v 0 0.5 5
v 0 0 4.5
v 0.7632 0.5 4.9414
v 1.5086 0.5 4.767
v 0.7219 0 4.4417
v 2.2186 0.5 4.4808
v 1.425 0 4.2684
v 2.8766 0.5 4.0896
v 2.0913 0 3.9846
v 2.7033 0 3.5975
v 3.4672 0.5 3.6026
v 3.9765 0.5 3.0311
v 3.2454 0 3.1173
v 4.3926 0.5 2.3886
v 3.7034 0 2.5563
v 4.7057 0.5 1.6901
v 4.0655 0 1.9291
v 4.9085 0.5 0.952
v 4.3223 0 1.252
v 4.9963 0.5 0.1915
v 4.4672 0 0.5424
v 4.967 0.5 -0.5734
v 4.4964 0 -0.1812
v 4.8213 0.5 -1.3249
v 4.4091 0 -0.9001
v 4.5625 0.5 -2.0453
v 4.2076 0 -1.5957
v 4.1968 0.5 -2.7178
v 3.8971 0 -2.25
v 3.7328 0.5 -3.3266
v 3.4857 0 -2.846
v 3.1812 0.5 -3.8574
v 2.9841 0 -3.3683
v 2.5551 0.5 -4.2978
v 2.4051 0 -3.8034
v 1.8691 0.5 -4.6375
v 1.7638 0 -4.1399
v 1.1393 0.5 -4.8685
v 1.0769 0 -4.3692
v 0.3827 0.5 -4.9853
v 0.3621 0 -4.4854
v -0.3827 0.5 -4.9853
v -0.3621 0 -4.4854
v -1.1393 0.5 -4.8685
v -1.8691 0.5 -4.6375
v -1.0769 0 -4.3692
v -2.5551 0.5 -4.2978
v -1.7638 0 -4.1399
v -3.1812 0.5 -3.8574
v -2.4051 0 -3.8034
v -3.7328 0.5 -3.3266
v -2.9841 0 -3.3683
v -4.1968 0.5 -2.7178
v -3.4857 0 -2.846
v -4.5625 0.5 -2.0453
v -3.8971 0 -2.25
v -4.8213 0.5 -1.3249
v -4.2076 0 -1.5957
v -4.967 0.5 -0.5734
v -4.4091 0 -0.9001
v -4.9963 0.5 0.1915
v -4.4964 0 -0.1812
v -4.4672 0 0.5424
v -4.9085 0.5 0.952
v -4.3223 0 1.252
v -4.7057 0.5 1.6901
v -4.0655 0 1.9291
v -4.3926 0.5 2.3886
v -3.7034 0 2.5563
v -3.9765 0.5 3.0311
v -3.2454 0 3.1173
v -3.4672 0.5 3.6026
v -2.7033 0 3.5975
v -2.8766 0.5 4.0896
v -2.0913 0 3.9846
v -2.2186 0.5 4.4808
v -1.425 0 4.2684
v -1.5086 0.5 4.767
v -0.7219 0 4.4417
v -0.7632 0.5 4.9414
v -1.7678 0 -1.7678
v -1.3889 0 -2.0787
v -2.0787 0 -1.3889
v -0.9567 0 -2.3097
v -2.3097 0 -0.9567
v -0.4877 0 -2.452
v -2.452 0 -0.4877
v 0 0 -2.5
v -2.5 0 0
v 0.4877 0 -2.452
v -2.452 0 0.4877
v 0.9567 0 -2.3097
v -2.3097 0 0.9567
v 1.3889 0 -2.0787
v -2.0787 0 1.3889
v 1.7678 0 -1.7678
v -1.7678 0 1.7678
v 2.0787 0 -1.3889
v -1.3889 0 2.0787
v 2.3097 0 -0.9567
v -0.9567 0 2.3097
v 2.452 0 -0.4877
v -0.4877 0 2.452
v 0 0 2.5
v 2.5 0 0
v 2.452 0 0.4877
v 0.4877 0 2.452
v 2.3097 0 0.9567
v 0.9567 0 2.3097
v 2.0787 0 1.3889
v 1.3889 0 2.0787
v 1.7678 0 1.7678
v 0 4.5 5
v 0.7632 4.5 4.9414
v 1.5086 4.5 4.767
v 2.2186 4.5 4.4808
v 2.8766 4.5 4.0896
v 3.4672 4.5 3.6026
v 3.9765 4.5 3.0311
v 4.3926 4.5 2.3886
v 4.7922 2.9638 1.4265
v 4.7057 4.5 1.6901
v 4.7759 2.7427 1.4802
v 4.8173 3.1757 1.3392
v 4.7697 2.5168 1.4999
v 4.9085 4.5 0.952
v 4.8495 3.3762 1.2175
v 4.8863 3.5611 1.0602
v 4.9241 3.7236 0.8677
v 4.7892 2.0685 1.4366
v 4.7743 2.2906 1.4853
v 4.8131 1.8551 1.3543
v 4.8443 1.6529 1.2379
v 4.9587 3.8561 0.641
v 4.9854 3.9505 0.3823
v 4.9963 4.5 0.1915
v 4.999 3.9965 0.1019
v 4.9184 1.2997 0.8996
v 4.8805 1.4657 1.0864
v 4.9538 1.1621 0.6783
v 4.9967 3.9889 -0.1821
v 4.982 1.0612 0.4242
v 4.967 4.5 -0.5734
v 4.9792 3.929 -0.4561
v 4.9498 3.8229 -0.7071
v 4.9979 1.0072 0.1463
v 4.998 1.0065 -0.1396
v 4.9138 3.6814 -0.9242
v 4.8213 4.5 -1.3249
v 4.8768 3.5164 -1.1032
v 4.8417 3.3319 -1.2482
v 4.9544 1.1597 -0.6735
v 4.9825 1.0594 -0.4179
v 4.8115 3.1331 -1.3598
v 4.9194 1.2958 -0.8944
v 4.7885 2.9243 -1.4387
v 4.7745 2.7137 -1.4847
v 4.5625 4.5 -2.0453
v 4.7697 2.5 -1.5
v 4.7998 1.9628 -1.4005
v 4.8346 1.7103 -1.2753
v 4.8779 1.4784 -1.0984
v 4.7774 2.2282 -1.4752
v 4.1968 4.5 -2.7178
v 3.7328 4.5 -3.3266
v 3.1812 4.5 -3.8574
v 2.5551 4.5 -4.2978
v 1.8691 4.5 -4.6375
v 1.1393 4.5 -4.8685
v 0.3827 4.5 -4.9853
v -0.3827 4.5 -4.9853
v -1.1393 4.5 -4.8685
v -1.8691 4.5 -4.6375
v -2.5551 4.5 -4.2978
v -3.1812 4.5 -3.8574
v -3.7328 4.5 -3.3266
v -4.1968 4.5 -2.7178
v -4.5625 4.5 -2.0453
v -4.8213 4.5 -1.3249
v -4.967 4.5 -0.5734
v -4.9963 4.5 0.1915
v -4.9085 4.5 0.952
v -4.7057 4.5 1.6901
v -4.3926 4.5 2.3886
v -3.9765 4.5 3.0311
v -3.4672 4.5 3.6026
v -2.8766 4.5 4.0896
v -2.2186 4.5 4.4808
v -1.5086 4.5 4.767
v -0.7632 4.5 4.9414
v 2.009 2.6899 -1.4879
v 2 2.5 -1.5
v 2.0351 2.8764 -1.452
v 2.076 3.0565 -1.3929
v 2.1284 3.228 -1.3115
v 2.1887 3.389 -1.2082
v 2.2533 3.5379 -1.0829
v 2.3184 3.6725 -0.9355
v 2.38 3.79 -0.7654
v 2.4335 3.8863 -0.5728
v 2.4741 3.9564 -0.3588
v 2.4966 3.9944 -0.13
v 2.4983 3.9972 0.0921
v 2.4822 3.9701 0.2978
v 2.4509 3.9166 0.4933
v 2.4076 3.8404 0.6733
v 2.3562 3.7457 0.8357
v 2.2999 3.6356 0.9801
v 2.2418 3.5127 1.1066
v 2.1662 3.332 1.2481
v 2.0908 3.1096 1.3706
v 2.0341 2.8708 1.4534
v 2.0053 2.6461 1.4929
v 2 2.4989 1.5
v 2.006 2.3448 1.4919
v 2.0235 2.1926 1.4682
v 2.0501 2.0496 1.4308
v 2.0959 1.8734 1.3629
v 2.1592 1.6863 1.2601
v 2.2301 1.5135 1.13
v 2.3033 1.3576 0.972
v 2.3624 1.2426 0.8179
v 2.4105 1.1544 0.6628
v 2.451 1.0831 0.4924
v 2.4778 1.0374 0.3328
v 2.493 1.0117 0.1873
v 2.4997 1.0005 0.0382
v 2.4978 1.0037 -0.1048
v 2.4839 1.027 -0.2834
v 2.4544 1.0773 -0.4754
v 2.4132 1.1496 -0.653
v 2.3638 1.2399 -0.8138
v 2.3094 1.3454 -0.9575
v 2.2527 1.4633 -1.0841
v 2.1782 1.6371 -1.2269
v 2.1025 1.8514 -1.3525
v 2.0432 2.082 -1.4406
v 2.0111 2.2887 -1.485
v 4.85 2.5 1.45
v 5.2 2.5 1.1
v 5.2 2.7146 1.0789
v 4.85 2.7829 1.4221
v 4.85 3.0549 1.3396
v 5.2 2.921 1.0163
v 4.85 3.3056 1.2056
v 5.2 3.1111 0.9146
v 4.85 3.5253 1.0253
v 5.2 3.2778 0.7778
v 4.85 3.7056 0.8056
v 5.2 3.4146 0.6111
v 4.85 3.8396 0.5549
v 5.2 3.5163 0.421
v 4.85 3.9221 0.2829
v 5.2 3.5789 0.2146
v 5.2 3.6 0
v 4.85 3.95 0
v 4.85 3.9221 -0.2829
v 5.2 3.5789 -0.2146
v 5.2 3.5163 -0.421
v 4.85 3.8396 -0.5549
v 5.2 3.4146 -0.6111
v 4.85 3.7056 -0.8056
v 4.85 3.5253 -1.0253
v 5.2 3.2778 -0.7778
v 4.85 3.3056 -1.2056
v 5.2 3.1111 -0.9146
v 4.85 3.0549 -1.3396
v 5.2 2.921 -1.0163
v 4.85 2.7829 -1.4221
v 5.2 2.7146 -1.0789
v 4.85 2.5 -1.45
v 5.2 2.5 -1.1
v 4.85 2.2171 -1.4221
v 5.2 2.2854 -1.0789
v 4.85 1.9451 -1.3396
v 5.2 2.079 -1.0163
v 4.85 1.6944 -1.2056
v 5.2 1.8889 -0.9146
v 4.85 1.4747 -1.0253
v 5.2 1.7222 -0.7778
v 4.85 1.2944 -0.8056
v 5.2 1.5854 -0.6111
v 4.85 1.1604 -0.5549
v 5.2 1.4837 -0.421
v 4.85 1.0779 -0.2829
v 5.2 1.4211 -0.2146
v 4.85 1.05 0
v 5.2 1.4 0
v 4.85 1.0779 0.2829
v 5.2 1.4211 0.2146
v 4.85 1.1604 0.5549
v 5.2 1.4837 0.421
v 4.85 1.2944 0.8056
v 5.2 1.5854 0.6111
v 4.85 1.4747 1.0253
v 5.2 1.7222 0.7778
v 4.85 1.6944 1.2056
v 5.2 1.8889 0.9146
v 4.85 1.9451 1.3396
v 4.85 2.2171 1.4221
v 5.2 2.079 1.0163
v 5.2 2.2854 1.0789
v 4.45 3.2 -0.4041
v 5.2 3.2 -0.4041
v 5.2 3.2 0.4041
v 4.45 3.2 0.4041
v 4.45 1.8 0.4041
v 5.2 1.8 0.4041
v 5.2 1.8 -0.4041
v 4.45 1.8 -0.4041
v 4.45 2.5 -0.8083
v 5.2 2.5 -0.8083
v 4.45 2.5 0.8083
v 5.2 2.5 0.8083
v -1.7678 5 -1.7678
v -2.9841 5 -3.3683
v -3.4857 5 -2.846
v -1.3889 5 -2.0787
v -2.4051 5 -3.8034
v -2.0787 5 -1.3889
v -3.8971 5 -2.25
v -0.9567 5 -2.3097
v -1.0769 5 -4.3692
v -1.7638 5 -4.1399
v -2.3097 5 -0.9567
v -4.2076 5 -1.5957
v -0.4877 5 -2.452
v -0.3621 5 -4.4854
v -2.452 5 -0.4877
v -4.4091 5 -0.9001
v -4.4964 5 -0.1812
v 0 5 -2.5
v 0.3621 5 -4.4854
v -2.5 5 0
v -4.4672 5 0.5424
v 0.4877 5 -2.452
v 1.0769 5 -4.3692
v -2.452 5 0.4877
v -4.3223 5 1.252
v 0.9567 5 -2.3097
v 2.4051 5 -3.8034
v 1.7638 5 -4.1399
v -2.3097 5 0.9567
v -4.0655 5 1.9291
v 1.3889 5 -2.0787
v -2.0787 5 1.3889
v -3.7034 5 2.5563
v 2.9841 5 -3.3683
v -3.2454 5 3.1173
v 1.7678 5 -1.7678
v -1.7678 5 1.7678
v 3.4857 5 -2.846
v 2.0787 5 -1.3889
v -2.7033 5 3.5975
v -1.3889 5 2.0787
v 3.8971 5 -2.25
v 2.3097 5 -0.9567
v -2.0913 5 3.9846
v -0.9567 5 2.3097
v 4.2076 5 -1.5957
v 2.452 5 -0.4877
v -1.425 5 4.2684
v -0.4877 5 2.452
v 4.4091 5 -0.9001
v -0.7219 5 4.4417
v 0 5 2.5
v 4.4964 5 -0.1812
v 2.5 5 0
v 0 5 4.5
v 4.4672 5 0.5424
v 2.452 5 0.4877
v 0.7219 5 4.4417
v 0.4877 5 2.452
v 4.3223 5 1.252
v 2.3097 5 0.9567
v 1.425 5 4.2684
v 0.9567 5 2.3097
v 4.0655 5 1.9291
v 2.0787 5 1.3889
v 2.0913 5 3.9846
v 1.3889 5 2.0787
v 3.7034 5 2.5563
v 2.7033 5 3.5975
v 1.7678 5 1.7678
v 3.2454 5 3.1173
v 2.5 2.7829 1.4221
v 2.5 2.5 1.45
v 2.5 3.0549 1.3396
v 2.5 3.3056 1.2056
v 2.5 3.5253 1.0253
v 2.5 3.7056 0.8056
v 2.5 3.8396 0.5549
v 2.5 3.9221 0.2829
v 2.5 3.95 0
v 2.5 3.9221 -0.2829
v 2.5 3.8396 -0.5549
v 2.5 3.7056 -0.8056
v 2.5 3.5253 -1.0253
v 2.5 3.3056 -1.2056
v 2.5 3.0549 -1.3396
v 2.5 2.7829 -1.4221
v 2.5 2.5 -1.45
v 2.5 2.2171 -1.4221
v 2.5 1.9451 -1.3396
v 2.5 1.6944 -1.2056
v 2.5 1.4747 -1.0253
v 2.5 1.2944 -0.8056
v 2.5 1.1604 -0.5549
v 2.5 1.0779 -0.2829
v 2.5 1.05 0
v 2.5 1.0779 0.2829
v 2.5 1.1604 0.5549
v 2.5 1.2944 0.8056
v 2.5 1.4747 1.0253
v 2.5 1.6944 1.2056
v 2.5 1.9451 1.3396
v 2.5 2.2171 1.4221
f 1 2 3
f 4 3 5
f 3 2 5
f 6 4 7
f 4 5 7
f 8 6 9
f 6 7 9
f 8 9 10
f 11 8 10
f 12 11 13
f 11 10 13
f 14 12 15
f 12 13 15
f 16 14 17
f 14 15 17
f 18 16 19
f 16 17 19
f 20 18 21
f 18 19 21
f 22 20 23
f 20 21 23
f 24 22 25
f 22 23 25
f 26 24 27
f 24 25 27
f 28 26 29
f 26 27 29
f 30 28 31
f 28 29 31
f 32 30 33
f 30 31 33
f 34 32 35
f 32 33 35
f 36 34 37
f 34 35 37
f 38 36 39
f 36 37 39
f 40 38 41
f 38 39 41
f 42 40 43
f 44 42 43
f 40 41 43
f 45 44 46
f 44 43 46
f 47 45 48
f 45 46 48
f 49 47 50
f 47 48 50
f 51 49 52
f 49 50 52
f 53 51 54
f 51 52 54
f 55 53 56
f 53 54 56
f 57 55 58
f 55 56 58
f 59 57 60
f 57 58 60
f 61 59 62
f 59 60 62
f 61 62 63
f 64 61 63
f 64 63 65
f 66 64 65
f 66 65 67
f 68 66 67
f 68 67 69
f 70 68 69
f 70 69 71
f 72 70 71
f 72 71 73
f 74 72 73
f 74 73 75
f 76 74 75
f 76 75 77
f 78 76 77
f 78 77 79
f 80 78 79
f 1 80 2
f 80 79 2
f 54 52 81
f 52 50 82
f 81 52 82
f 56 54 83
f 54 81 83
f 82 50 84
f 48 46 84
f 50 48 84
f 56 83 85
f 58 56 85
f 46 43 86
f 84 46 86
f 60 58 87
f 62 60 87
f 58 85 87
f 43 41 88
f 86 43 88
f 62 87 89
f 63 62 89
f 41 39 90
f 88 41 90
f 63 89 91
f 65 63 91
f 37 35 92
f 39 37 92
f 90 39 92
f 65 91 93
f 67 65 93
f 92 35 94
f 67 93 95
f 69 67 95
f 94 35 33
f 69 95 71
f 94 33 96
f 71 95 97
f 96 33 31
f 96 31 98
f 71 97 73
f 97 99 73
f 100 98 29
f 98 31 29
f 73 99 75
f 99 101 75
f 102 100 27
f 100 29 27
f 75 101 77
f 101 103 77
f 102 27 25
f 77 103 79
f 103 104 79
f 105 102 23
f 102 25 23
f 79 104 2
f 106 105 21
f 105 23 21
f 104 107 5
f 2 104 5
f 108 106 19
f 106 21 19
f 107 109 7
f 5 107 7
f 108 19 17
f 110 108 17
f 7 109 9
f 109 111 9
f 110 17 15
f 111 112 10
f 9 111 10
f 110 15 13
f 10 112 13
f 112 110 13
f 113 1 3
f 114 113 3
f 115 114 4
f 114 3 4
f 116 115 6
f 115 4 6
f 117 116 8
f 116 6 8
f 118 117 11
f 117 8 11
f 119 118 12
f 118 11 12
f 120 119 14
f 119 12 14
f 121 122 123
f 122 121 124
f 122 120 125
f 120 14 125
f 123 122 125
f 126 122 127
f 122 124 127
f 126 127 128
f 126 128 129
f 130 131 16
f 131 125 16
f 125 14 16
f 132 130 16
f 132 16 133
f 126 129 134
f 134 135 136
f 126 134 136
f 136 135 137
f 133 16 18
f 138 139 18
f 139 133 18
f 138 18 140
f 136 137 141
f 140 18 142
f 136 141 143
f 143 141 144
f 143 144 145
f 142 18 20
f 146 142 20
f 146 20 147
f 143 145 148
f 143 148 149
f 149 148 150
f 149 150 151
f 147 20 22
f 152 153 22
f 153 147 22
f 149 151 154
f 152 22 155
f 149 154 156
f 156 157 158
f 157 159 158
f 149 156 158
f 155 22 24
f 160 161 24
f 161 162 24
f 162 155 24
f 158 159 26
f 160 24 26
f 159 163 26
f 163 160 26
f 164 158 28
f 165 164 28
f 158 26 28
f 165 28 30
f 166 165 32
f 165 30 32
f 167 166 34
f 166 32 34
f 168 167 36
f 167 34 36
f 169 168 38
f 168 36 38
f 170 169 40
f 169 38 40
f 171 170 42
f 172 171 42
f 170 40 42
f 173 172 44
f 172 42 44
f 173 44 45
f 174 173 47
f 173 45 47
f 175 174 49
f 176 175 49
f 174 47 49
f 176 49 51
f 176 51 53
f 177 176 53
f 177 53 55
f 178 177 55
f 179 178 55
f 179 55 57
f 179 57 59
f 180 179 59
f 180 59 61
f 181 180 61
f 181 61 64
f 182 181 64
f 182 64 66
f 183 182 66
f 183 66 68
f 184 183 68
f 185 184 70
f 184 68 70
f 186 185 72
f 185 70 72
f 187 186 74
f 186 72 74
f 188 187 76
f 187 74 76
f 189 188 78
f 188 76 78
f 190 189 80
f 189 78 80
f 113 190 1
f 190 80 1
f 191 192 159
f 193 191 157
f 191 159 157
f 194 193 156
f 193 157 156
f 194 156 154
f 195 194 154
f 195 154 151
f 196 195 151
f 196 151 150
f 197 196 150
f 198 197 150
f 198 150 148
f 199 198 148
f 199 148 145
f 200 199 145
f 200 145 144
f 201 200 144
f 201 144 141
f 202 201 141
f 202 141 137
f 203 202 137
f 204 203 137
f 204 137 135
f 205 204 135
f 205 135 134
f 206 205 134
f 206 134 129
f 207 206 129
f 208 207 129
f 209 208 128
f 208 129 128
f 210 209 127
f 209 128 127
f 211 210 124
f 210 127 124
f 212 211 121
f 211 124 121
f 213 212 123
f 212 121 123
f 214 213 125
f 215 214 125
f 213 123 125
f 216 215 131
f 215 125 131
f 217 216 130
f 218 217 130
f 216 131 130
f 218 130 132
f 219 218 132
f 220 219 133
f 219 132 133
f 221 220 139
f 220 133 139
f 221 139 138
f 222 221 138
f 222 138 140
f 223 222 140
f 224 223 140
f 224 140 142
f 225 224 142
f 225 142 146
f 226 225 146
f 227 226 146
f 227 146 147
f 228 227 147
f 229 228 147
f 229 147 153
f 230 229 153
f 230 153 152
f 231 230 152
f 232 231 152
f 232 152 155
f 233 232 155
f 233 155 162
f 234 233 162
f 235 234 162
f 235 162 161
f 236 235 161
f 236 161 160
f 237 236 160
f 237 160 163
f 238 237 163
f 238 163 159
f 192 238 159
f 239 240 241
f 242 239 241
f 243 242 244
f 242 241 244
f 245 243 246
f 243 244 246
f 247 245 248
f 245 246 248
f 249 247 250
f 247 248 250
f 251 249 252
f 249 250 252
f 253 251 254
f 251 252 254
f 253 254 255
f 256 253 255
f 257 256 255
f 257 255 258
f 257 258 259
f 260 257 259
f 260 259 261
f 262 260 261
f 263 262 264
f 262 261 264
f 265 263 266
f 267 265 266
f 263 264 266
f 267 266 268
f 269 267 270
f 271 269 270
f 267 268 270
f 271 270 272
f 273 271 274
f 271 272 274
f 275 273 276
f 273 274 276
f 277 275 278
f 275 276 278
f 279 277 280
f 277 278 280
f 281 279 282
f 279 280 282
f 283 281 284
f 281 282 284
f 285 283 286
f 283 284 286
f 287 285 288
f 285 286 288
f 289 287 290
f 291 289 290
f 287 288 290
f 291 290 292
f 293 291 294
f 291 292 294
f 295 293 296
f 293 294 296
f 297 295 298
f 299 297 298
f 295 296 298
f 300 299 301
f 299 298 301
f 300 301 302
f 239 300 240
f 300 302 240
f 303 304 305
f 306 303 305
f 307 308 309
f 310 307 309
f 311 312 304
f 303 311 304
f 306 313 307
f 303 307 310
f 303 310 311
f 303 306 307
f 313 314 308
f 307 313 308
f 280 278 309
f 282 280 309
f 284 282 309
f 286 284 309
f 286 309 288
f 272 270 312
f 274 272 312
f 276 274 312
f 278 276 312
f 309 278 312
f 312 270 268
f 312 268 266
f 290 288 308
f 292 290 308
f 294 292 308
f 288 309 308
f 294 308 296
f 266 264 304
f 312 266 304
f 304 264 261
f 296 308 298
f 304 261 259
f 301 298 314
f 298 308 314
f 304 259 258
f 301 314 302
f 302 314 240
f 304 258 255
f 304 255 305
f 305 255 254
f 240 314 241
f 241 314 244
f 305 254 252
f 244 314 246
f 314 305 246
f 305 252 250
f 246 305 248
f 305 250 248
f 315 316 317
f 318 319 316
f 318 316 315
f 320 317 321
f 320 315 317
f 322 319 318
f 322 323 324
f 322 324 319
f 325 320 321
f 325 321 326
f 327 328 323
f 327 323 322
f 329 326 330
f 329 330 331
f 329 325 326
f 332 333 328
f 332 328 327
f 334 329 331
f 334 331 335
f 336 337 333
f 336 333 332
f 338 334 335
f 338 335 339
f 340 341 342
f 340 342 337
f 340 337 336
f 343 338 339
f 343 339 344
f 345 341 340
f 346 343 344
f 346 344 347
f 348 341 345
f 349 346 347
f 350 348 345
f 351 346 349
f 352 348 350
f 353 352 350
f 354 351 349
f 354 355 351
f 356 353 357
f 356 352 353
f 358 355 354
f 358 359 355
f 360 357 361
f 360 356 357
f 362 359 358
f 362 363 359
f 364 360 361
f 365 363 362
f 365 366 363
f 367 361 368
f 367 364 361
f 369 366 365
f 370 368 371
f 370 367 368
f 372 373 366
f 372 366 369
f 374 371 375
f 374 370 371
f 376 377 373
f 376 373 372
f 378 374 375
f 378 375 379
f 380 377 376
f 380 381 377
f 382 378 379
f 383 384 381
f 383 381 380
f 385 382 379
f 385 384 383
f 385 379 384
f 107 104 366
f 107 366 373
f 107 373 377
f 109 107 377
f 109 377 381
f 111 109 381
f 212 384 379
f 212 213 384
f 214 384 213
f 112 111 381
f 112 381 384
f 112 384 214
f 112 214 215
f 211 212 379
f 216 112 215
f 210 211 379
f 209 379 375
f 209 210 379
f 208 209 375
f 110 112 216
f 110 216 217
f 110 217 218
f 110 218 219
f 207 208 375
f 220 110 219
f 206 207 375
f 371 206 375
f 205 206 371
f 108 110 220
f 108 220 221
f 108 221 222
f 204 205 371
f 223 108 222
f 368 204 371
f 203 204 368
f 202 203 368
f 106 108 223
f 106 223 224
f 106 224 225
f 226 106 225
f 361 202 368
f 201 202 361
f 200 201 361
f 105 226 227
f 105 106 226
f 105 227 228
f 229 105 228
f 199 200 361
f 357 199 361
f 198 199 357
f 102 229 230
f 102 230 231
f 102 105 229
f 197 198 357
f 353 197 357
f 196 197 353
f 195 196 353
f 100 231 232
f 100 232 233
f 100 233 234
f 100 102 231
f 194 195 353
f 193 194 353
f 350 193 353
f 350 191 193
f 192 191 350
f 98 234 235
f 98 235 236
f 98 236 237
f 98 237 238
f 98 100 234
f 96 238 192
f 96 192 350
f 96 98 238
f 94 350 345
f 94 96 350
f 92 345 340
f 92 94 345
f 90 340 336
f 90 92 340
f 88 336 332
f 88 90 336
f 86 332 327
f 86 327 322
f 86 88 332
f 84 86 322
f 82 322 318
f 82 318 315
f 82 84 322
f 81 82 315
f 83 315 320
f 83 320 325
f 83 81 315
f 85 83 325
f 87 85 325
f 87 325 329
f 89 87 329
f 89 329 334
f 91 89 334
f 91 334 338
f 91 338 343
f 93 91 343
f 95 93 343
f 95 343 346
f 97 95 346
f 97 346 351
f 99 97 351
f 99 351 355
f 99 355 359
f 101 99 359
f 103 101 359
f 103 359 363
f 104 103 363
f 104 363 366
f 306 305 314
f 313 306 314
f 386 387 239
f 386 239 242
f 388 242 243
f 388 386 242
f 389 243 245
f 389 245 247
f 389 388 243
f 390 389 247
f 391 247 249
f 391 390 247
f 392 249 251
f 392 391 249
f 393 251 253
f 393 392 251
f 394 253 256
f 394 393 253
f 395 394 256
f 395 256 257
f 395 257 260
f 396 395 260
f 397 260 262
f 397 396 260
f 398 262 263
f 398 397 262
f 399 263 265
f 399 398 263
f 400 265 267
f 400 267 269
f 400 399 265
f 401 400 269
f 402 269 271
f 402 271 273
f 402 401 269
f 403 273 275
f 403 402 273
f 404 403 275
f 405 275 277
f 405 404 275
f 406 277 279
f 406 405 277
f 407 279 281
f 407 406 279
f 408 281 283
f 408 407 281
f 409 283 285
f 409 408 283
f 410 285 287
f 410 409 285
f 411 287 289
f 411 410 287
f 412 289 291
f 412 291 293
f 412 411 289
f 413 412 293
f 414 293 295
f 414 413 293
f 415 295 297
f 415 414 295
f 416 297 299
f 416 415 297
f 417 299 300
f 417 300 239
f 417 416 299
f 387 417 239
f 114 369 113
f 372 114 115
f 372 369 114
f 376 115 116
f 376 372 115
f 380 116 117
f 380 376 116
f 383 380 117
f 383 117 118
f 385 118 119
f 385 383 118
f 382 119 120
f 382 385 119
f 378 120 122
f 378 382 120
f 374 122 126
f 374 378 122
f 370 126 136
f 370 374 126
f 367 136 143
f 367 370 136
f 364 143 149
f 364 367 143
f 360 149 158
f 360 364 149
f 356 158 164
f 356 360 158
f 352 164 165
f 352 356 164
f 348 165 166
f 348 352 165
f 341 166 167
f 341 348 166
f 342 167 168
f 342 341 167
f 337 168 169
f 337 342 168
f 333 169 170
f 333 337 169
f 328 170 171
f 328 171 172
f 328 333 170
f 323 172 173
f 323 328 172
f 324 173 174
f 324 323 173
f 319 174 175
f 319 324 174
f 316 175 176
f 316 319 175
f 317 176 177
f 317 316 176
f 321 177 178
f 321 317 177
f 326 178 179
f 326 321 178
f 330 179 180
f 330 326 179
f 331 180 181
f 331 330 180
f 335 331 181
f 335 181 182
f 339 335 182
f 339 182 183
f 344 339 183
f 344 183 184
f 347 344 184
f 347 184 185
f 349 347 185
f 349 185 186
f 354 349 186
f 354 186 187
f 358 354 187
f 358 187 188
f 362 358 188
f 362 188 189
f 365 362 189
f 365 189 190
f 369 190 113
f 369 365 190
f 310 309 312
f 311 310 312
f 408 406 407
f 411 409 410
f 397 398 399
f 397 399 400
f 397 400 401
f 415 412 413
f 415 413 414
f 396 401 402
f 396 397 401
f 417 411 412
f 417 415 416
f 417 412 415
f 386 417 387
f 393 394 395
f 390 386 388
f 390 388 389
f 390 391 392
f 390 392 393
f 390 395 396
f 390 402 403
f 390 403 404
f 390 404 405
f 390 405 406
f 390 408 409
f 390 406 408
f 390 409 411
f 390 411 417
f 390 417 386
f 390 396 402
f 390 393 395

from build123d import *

# Parameters (mm, degrees)
SKETCH1_R               = 5
SKETCH1_R_2             = 2.5
BOSS_EXTRUDE1_DEPTH     = 5
CUT_EXTRUDE1_REACH      = 14.247
CUT_EXTRUDE1_END_RADIUS = 2.5
SKETCH2_R               = 1.5
CHAMFER1_SIZE           = 0.5
SKETCH3_R               = 1.45
BOSS_EXTRUDE3_DEPTH     = 2.7
CHAMFER3_SIZE           = 0.35
CUT_EXTRUDE2_DEPTH      = 0.75


with BuildPart() as part:
    # Sketch1 → Boss-Extrude1 (new body)
    with BuildSketch(Plane(origin=(0, 0, 0), x_dir=(1, 0, 0), z_dir=(0, 1, 0))):
        with Locations(Location((0, 0, 0), (0, 0, 270))):
            Circle(SKETCH1_R)
        with Locations(Location((0, 0, 0), (0, 0, 270))):
            Circle(SKETCH1_R_2, mode=Mode.SUBTRACT)
    extrude(amount=BOSS_EXTRUDE1_DEPTH)

    # Cut-Extrude1: up to this cylinder (the profile starts outside it)
    cut_extrude1_end = Plane(origin=(0, 2.5, 0), z_dir=(0, -1, 0)) * Cylinder(CUT_EXTRUDE1_END_RADIUS, 34.494, mode=Mode.PRIVATE)
    # Sketch2 → Cut-Extrude1 (cut, up to the surface)
    with BuildSketch(Plane(origin=(5, 0, 0), x_dir=(0, 0, -1), z_dir=(1, 0, 0)), mode=Mode.PRIVATE) as cut_extrude1_sk1:
        with Locations((0, 2.5)):
            Circle(SKETCH2_R)
    cut_extrude1_tool1 = extrude(cut_extrude1_sk1.sketch, amount=-CUT_EXTRUDE1_REACH, mode=Mode.PRIVATE) - cut_extrude1_end
    add(cut_extrude1_tool1.solids().sort_by_distance((5, 2.5, 0))[0], mode=Mode.SUBTRACT)

    # Chamfer1
    chamfer1_edges = [part.edges().sort_by_distance(p)[0] for p in [
        (0, 0, -5),
        (0, 5, -5),
    ]]
    chamfer(chamfer1_edges, length=CHAMFER1_SIZE)


with BuildPart() as body_2:
    # Sketch3 → Boss-Extrude3 (new body)
    with BuildSketch(Plane.ZY.offset(-2.5)):
        with Locations((0, 2.5)):
            Circle(SKETCH3_R)
    extrude(amount=-BOSS_EXTRUDE3_DEPTH)

    # Chamfer3
    chamfer3_edges = [body_2.edges().sort_by_distance(p)[0] for p in [
        (5.2, 2.5, -1.45),
    ]]
    chamfer(chamfer3_edges, length=CHAMFER3_SIZE)

    # Sketch4 → Cut-Extrude2 (cut)
    with BuildSketch(Plane(origin=(5.2, 0, 0), x_dir=(0, 0, -1), z_dir=(1, 0, 0))):
        Polygon((0.808290377, 2.5), (0.404145188, 3.2), (-0.404145188, 3.2), (-0.808290377, 2.5), (-0.404145188, 1.8), (0.404145188, 1.8), align=None)
    extrude(amount=-CUT_EXTRUDE2_DEPTH, mode=Mode.SUBTRACT)


solid = Compound([part.part, body_2.part])
